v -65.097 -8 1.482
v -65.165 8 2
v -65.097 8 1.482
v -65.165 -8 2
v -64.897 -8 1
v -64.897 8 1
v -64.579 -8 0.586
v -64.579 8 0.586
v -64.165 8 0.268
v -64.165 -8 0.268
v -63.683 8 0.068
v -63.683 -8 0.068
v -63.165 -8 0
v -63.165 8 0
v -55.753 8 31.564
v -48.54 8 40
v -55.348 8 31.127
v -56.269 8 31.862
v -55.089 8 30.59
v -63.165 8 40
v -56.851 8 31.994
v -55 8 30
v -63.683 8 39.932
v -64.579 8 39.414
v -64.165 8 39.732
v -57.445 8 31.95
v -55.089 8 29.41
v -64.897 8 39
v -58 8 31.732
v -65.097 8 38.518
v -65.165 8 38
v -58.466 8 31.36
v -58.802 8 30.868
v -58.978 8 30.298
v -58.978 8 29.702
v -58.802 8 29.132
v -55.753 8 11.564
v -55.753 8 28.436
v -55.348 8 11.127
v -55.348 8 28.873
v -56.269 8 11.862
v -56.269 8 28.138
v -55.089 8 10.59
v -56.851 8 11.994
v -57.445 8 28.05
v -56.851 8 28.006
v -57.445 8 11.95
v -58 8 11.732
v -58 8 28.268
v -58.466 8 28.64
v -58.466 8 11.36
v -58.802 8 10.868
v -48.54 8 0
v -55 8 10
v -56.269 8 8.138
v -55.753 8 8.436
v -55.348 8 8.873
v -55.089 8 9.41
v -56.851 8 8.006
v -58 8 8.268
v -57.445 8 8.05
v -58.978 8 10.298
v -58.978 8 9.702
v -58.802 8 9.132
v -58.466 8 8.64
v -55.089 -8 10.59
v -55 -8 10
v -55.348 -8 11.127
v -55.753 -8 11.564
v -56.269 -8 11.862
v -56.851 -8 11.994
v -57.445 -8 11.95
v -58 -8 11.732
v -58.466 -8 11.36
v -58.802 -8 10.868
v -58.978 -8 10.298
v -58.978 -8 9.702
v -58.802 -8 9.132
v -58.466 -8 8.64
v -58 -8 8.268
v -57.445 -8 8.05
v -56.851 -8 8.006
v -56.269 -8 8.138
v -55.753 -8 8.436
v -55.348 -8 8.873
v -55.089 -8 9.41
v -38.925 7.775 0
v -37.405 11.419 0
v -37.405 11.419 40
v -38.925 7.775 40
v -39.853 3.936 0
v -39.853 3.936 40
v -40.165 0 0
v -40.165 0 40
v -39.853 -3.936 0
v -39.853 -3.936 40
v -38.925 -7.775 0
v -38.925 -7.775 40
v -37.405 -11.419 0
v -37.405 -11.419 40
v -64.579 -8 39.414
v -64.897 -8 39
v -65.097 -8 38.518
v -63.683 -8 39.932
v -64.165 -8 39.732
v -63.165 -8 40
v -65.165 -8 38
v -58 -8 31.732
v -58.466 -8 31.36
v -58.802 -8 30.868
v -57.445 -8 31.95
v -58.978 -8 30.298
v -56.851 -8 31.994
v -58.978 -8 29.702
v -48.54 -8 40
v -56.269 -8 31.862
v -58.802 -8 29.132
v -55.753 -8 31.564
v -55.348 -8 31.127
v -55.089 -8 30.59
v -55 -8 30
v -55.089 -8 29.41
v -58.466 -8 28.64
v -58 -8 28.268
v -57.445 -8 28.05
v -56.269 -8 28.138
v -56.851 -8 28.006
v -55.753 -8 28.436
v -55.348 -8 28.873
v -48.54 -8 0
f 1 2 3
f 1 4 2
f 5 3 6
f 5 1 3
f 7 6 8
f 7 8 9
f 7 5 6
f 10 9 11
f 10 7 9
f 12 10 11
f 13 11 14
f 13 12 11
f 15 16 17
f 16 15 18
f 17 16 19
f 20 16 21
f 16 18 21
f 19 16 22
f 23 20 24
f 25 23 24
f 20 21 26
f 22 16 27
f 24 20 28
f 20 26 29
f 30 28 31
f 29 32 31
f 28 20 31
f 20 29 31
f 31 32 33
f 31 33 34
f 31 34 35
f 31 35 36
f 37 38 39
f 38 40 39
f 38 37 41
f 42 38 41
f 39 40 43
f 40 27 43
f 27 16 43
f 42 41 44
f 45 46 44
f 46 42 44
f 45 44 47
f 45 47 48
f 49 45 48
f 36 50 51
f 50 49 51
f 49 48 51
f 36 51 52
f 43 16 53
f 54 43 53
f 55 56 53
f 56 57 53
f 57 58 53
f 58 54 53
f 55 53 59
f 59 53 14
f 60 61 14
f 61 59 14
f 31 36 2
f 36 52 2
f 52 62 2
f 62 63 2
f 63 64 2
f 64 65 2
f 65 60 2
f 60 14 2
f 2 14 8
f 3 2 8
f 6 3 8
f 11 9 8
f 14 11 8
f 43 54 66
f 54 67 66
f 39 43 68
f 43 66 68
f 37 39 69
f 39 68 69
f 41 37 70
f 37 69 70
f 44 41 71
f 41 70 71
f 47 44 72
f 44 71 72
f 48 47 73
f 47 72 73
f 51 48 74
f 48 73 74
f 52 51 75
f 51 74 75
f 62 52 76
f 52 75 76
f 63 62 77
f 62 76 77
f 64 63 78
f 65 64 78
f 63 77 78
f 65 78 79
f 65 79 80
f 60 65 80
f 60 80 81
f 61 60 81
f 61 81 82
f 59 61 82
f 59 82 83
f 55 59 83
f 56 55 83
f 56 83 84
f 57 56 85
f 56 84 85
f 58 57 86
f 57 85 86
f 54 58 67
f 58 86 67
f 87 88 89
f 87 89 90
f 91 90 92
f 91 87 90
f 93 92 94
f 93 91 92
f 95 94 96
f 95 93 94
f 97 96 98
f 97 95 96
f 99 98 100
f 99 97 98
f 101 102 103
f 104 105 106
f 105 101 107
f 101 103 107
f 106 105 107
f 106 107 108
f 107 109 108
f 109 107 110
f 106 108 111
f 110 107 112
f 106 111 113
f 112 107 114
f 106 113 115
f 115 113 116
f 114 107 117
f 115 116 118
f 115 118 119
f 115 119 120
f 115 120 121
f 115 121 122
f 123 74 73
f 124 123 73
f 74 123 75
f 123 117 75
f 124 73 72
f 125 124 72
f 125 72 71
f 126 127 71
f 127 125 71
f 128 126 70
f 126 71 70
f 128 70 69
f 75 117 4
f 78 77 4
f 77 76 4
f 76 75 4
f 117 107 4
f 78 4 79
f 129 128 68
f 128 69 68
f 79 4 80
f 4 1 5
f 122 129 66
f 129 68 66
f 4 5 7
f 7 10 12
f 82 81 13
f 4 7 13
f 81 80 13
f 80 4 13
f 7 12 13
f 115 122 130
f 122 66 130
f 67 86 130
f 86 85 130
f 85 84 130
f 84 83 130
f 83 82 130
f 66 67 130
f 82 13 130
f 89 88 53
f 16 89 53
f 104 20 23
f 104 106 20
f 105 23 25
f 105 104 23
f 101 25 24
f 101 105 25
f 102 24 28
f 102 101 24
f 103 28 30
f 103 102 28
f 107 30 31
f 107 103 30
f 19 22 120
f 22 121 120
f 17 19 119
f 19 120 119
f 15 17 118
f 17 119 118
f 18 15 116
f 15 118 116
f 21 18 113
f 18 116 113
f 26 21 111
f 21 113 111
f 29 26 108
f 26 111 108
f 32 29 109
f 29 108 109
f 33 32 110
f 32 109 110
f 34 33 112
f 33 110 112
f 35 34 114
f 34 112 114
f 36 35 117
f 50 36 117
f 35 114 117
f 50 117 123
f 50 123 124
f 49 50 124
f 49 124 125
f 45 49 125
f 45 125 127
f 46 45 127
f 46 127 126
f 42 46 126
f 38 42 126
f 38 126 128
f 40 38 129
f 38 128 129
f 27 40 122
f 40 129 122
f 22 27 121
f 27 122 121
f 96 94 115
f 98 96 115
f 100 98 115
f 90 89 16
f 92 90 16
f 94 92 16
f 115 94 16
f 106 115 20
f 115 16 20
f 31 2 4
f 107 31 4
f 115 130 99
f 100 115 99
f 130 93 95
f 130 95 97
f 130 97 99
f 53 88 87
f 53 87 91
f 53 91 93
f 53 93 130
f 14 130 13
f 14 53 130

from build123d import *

# Parameters (mm, degrees)
PAD002_DEPTH         = 40
SKETCH005_R          = 2
POCKET002_DEPTH      = 11.42
POCKET002_DEPTH_BACK = 11.42
FILLET003_R          = 2


with BuildPart() as part:
    # Sketch004 → Pad002 (new body)
    with BuildSketch(Plane.XY):
        with BuildLine():
            ThreePointArc((-7.404873, 11.419), (-10.165124, 0), (-7.404873, -11.419))
            Line((-18.540205, -8), (-7.404873, -11.419))
            Line((-35.165124, -8), (-18.540205, -8))
            Line((-35.165124, 8), (-35.165124, -8))
            Line((-18.540205, 8), (-35.165124, 8))
            Line((-7.404873, 11.419), (-18.540205, 8))
        make_face()
    extrude(amount=PAD002_DEPTH)

    # Sketch005 → Pocket002 (cut, two sides)
    with BuildSketch(Plane.XZ) as pocket002_sk:
        with Locations((-27, 30)):
            Circle(SKETCH005_R)
        with Locations((-27, 10)):
            Circle(SKETCH005_R)
    extrude(amount=-POCKET002_DEPTH, mode=Mode.SUBTRACT)
    extrude(pocket002_sk.sketch, amount=POCKET002_DEPTH_BACK, mode=Mode.SUBTRACT)

    # Fillet003
    fillet003_edges = [part.edges().sort_by_distance(p)[0] for p in [
        (-35.165124, 0, 40),
        (-35.165124, 0, 0),
    ]]
    fillet(fillet003_edges, radius=FILLET003_R)


with BuildPart() as part_1:
    # Body002 placement: moved
    add(part.part.moved(Location((-30, 0, 0))))


solid = part_1.part
